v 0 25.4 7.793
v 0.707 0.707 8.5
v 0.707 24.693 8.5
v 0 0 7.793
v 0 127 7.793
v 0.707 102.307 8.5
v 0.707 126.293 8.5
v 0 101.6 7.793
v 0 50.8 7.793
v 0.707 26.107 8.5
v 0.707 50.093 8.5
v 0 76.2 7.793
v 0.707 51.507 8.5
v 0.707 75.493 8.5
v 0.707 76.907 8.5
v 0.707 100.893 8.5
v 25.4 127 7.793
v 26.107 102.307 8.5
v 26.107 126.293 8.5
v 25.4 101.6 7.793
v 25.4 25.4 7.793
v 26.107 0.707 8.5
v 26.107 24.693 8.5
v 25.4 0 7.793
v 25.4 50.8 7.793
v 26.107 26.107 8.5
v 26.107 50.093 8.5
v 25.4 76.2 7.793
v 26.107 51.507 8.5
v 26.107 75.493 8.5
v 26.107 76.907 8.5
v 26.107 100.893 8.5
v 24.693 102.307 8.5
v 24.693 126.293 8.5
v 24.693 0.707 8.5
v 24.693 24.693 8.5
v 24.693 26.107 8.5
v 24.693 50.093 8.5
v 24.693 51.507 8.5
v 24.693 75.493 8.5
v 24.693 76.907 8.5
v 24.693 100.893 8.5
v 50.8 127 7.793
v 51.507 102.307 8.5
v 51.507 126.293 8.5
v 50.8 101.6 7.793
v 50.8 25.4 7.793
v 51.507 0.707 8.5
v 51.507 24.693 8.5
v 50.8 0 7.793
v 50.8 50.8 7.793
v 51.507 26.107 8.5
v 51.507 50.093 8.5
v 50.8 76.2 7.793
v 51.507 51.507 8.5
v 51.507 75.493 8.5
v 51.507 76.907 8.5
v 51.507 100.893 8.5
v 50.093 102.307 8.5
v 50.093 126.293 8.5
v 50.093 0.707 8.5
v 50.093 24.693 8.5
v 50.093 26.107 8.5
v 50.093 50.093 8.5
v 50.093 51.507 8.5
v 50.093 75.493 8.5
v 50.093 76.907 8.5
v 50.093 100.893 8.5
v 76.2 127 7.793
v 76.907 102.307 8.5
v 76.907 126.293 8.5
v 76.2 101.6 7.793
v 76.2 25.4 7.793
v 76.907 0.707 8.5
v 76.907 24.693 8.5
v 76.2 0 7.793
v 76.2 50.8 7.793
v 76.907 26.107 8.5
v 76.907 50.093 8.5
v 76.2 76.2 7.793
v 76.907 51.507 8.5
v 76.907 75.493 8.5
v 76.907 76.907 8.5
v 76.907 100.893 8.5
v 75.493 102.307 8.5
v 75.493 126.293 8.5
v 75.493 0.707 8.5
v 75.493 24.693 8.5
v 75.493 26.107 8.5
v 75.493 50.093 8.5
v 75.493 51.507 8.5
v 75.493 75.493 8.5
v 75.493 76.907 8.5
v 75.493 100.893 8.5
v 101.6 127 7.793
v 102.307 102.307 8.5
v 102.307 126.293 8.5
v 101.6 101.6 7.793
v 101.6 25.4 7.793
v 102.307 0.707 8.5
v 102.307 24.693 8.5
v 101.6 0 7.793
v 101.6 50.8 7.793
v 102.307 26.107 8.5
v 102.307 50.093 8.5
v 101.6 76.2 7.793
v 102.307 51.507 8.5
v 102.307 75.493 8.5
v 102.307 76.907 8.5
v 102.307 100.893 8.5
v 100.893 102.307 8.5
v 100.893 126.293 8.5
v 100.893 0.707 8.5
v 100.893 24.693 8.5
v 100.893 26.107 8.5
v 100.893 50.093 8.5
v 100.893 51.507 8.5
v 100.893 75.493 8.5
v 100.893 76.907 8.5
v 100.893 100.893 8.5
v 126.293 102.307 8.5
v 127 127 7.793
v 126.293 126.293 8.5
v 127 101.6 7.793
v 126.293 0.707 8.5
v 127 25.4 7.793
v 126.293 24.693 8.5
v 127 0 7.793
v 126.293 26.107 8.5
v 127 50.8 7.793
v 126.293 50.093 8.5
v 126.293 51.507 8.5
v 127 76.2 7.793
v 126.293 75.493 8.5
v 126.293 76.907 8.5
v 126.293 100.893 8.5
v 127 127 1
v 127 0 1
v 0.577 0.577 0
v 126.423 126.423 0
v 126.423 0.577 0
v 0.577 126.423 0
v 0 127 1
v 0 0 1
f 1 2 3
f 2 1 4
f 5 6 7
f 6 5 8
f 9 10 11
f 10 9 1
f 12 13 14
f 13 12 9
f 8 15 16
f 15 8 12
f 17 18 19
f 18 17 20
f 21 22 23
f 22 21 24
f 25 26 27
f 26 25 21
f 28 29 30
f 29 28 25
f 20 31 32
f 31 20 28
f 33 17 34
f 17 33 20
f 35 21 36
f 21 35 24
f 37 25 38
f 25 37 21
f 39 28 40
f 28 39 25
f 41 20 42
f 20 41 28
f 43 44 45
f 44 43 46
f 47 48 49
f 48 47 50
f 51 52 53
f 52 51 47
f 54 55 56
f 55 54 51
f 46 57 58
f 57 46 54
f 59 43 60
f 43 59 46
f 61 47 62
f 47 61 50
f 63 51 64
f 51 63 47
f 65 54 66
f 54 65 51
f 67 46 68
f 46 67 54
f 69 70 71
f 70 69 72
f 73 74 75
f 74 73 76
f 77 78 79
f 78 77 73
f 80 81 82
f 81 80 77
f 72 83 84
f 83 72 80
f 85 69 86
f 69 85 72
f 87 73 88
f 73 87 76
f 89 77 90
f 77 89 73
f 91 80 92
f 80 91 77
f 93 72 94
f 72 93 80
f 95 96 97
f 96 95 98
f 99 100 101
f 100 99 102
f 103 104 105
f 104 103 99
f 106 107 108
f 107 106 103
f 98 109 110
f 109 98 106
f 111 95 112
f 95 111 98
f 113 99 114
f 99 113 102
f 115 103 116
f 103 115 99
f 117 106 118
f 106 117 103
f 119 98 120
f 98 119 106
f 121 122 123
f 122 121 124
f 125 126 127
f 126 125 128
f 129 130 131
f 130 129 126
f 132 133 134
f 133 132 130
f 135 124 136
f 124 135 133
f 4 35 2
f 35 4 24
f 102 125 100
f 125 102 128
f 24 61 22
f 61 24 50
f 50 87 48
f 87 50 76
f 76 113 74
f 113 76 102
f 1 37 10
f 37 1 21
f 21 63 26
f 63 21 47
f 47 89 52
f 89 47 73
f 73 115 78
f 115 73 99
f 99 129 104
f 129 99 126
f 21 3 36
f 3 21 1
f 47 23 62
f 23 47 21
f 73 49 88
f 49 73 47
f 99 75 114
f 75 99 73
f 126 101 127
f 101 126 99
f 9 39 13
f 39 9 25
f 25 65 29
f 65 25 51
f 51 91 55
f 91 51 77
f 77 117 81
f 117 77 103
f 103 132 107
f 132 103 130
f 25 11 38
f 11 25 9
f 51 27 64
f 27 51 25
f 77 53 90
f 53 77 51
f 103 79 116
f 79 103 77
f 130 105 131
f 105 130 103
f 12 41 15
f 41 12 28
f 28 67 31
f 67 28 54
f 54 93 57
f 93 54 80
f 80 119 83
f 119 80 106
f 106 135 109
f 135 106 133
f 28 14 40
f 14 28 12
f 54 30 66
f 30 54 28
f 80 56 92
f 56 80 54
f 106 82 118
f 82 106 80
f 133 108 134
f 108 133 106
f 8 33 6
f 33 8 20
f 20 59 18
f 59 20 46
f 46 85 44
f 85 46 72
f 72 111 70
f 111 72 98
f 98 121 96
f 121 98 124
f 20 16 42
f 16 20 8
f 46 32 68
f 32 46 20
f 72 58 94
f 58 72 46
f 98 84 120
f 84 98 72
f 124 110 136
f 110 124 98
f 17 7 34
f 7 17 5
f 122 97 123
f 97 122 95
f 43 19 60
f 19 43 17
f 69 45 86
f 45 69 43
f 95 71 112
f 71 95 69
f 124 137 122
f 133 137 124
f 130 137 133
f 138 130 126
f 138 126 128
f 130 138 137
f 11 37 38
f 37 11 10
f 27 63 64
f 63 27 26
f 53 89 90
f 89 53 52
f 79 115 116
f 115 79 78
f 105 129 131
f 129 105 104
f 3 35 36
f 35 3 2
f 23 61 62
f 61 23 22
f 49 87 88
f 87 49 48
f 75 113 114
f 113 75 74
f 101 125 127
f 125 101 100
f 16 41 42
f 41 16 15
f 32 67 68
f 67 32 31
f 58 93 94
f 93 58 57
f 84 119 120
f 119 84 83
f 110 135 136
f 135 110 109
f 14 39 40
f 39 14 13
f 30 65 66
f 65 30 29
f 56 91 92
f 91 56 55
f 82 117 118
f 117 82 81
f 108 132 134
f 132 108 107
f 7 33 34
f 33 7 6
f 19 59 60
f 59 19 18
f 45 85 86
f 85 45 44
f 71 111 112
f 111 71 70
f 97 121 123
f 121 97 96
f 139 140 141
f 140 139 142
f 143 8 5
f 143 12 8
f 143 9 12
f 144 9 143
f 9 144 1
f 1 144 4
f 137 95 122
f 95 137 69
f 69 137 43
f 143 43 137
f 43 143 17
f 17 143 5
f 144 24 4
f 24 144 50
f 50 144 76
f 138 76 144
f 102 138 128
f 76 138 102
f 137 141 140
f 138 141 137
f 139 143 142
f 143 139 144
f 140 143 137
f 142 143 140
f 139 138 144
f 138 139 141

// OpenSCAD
thickness=8.5;
tilex=5;
tiley=5;
inch=25.4;
groove=1;

//floor
difference()
{
    
    translate([tilex*inch/2,tiley*inch/2,thickness/2])cube([tilex*inch,tiley*inch,thickness],center=true);
    pocks=3;//floor(rands(0,(tilex*tiley)*.55,1)[0]);
    echo (pocks);
    for (ii=[0:pocks])
    {
        shapenum = floor(rands(0,16,1)[0])+1;
        angle=floor(rands(0,360,1)[0])+1;
        xx=inch*(rands(0,tilex,1)[0]);
        yy=inch*(rands(0,tiley,1)[0]);
        translate([xx,yy,0])rotate([0,0,angle])translate([0,0,thickness])blemish(shapenum);
    }
    for (ii=[0:tilex])
    {
        translate([ii*inch,tiley*inch/2,thickness])rotate([0,45,0])cube([groove,tiley*inch*2,groove],center=true);
    }
    for (ii=[0:tiley])
    {
        translate([tilex*inch/2,ii*inch,thickness])rotate([45,0,0])cube([tilex*inch*2,groove,groove],center=true);
    }
    translate([tilex*inch,tiley*inch/2,0])rotate([0,30,0])cube([groove,tiley*inch*2,groove*2],center=true);
    translate([0,tiley*inch/2,0])rotate([0,60,0])cube([groove*2,tiley*inch*2,groove],center=true);
    translate([tilex*inch/2,tiley*inch,0])rotate([60,0,0])cube([tilex*inch*2,groove*2,groove],center=true);
    translate([tilex*inch/2,0,0])rotate([30,0,0])cube([tilex*inch*2,groove,groove*2],center=true);
}


module selectshape(shapenum)
{
    
    if (shapenum==1){ shape01(); }
    if (shapenum==2){ shape02(); }
    if (shapenum==3){ shape03(); }
    if (shapenum==4){ shape04(); }
    if (shapenum==5){ shape05(); }
    if (shapenum==6){ shape06(); }
    if (shapenum==7){ shape07(); }
    if (shapenum==8){ shape08(); }
    if (shapenum==9){ shape09(); }
    if (shapenum==10){ shape10(); }
    if (shapenum==11){ shape11(); }
    if (shapenum==12){ shape12(); }
    if (shapenum==13){ shape13(); }
    if (shapenum==14){ shape14(); }
    if (shapenum==15){ shape15(); }
    if (shapenum==16){ shape16(); }
}
module blemish(shapenum)
{
    
    {
        translate([0,0,-.5])linear_extrude(height=.101)selectshape(shapenum);
        translate([0,0,-.4])linear_extrude(height=.101)minkowski(){selectshape(shapenum); circle(r=.1);}
        translate([0,0,-.3])linear_extrude(height=.101)minkowski(){selectshape(shapenum); circle(r=.2);}
        translate([0,0,-.2])linear_extrude(height=.101)minkowski(){selectshape(shapenum); circle(r=.3);}
        translate([0,0,-.1])linear_extrude(height=.101)minkowski(){selectshape(shapenum); circle(r=.4);}
    }
}
module shape01()
{
    translate([-3,-2])scale(.8)import("blemish/shape001.dxf");
}
module shape02()
{
    translate([-3,-2])scale(.8)import("blemish/shape002.dxf");
}
module shape03()
{
    translate([-3,-2,0])scale(.8)import("blemish/shape003.dxf");
}
module shape04()
{
    translate([-14,-18,0])scale(.8)import("blemish/shape004.dxf");
}
module shape05()
{
    translate([-13,-10,0])scale(.8)import("blemish/shape005.dxf");
}
module shape06()
{
    translate([-2,-4,0])scale(.32)import("blemish/shape006.dxf");
}
module shape07()
{
    translate([-9,-9,0])scale(.3)import("blemish/shape007.dxf");
}
module shape08()
{
    translate([-6,-12,0])scale(.6)import("blemish/shape008.dxf");
}
module shape09()
{
    translate([-2,-2,0])scale(.2)import("blemish/shape009.dxf");
}
module shape10()
{
    translate([-1,-3,0])scale(.1)import("blemish/shape010.dxf");
}
module shape11()
{
    translate([-2,-4,0])scale(.3)import("blemish/shape011.dxf");
}
module shape12()
{
    translate([-6,-2,0])scale(.6)import("blemish/shape012.dxf");
}
module shape13()
{
    translate([-9,-14,0])scale(.7)import("blemish/shape013.dxf");
}
module shape14()
{
    translate([-0.5,-1,0])scale(.1)import("blemish/shape014.dxf");
}
module shape15()
{
    translate([-.5,-.5,0])scale(.1)import("blemish/shape015.dxf");
}
module shape16()
{
    translate([-6,-6,0])scale(.5)import("blemish/shape016.dxf");
}
